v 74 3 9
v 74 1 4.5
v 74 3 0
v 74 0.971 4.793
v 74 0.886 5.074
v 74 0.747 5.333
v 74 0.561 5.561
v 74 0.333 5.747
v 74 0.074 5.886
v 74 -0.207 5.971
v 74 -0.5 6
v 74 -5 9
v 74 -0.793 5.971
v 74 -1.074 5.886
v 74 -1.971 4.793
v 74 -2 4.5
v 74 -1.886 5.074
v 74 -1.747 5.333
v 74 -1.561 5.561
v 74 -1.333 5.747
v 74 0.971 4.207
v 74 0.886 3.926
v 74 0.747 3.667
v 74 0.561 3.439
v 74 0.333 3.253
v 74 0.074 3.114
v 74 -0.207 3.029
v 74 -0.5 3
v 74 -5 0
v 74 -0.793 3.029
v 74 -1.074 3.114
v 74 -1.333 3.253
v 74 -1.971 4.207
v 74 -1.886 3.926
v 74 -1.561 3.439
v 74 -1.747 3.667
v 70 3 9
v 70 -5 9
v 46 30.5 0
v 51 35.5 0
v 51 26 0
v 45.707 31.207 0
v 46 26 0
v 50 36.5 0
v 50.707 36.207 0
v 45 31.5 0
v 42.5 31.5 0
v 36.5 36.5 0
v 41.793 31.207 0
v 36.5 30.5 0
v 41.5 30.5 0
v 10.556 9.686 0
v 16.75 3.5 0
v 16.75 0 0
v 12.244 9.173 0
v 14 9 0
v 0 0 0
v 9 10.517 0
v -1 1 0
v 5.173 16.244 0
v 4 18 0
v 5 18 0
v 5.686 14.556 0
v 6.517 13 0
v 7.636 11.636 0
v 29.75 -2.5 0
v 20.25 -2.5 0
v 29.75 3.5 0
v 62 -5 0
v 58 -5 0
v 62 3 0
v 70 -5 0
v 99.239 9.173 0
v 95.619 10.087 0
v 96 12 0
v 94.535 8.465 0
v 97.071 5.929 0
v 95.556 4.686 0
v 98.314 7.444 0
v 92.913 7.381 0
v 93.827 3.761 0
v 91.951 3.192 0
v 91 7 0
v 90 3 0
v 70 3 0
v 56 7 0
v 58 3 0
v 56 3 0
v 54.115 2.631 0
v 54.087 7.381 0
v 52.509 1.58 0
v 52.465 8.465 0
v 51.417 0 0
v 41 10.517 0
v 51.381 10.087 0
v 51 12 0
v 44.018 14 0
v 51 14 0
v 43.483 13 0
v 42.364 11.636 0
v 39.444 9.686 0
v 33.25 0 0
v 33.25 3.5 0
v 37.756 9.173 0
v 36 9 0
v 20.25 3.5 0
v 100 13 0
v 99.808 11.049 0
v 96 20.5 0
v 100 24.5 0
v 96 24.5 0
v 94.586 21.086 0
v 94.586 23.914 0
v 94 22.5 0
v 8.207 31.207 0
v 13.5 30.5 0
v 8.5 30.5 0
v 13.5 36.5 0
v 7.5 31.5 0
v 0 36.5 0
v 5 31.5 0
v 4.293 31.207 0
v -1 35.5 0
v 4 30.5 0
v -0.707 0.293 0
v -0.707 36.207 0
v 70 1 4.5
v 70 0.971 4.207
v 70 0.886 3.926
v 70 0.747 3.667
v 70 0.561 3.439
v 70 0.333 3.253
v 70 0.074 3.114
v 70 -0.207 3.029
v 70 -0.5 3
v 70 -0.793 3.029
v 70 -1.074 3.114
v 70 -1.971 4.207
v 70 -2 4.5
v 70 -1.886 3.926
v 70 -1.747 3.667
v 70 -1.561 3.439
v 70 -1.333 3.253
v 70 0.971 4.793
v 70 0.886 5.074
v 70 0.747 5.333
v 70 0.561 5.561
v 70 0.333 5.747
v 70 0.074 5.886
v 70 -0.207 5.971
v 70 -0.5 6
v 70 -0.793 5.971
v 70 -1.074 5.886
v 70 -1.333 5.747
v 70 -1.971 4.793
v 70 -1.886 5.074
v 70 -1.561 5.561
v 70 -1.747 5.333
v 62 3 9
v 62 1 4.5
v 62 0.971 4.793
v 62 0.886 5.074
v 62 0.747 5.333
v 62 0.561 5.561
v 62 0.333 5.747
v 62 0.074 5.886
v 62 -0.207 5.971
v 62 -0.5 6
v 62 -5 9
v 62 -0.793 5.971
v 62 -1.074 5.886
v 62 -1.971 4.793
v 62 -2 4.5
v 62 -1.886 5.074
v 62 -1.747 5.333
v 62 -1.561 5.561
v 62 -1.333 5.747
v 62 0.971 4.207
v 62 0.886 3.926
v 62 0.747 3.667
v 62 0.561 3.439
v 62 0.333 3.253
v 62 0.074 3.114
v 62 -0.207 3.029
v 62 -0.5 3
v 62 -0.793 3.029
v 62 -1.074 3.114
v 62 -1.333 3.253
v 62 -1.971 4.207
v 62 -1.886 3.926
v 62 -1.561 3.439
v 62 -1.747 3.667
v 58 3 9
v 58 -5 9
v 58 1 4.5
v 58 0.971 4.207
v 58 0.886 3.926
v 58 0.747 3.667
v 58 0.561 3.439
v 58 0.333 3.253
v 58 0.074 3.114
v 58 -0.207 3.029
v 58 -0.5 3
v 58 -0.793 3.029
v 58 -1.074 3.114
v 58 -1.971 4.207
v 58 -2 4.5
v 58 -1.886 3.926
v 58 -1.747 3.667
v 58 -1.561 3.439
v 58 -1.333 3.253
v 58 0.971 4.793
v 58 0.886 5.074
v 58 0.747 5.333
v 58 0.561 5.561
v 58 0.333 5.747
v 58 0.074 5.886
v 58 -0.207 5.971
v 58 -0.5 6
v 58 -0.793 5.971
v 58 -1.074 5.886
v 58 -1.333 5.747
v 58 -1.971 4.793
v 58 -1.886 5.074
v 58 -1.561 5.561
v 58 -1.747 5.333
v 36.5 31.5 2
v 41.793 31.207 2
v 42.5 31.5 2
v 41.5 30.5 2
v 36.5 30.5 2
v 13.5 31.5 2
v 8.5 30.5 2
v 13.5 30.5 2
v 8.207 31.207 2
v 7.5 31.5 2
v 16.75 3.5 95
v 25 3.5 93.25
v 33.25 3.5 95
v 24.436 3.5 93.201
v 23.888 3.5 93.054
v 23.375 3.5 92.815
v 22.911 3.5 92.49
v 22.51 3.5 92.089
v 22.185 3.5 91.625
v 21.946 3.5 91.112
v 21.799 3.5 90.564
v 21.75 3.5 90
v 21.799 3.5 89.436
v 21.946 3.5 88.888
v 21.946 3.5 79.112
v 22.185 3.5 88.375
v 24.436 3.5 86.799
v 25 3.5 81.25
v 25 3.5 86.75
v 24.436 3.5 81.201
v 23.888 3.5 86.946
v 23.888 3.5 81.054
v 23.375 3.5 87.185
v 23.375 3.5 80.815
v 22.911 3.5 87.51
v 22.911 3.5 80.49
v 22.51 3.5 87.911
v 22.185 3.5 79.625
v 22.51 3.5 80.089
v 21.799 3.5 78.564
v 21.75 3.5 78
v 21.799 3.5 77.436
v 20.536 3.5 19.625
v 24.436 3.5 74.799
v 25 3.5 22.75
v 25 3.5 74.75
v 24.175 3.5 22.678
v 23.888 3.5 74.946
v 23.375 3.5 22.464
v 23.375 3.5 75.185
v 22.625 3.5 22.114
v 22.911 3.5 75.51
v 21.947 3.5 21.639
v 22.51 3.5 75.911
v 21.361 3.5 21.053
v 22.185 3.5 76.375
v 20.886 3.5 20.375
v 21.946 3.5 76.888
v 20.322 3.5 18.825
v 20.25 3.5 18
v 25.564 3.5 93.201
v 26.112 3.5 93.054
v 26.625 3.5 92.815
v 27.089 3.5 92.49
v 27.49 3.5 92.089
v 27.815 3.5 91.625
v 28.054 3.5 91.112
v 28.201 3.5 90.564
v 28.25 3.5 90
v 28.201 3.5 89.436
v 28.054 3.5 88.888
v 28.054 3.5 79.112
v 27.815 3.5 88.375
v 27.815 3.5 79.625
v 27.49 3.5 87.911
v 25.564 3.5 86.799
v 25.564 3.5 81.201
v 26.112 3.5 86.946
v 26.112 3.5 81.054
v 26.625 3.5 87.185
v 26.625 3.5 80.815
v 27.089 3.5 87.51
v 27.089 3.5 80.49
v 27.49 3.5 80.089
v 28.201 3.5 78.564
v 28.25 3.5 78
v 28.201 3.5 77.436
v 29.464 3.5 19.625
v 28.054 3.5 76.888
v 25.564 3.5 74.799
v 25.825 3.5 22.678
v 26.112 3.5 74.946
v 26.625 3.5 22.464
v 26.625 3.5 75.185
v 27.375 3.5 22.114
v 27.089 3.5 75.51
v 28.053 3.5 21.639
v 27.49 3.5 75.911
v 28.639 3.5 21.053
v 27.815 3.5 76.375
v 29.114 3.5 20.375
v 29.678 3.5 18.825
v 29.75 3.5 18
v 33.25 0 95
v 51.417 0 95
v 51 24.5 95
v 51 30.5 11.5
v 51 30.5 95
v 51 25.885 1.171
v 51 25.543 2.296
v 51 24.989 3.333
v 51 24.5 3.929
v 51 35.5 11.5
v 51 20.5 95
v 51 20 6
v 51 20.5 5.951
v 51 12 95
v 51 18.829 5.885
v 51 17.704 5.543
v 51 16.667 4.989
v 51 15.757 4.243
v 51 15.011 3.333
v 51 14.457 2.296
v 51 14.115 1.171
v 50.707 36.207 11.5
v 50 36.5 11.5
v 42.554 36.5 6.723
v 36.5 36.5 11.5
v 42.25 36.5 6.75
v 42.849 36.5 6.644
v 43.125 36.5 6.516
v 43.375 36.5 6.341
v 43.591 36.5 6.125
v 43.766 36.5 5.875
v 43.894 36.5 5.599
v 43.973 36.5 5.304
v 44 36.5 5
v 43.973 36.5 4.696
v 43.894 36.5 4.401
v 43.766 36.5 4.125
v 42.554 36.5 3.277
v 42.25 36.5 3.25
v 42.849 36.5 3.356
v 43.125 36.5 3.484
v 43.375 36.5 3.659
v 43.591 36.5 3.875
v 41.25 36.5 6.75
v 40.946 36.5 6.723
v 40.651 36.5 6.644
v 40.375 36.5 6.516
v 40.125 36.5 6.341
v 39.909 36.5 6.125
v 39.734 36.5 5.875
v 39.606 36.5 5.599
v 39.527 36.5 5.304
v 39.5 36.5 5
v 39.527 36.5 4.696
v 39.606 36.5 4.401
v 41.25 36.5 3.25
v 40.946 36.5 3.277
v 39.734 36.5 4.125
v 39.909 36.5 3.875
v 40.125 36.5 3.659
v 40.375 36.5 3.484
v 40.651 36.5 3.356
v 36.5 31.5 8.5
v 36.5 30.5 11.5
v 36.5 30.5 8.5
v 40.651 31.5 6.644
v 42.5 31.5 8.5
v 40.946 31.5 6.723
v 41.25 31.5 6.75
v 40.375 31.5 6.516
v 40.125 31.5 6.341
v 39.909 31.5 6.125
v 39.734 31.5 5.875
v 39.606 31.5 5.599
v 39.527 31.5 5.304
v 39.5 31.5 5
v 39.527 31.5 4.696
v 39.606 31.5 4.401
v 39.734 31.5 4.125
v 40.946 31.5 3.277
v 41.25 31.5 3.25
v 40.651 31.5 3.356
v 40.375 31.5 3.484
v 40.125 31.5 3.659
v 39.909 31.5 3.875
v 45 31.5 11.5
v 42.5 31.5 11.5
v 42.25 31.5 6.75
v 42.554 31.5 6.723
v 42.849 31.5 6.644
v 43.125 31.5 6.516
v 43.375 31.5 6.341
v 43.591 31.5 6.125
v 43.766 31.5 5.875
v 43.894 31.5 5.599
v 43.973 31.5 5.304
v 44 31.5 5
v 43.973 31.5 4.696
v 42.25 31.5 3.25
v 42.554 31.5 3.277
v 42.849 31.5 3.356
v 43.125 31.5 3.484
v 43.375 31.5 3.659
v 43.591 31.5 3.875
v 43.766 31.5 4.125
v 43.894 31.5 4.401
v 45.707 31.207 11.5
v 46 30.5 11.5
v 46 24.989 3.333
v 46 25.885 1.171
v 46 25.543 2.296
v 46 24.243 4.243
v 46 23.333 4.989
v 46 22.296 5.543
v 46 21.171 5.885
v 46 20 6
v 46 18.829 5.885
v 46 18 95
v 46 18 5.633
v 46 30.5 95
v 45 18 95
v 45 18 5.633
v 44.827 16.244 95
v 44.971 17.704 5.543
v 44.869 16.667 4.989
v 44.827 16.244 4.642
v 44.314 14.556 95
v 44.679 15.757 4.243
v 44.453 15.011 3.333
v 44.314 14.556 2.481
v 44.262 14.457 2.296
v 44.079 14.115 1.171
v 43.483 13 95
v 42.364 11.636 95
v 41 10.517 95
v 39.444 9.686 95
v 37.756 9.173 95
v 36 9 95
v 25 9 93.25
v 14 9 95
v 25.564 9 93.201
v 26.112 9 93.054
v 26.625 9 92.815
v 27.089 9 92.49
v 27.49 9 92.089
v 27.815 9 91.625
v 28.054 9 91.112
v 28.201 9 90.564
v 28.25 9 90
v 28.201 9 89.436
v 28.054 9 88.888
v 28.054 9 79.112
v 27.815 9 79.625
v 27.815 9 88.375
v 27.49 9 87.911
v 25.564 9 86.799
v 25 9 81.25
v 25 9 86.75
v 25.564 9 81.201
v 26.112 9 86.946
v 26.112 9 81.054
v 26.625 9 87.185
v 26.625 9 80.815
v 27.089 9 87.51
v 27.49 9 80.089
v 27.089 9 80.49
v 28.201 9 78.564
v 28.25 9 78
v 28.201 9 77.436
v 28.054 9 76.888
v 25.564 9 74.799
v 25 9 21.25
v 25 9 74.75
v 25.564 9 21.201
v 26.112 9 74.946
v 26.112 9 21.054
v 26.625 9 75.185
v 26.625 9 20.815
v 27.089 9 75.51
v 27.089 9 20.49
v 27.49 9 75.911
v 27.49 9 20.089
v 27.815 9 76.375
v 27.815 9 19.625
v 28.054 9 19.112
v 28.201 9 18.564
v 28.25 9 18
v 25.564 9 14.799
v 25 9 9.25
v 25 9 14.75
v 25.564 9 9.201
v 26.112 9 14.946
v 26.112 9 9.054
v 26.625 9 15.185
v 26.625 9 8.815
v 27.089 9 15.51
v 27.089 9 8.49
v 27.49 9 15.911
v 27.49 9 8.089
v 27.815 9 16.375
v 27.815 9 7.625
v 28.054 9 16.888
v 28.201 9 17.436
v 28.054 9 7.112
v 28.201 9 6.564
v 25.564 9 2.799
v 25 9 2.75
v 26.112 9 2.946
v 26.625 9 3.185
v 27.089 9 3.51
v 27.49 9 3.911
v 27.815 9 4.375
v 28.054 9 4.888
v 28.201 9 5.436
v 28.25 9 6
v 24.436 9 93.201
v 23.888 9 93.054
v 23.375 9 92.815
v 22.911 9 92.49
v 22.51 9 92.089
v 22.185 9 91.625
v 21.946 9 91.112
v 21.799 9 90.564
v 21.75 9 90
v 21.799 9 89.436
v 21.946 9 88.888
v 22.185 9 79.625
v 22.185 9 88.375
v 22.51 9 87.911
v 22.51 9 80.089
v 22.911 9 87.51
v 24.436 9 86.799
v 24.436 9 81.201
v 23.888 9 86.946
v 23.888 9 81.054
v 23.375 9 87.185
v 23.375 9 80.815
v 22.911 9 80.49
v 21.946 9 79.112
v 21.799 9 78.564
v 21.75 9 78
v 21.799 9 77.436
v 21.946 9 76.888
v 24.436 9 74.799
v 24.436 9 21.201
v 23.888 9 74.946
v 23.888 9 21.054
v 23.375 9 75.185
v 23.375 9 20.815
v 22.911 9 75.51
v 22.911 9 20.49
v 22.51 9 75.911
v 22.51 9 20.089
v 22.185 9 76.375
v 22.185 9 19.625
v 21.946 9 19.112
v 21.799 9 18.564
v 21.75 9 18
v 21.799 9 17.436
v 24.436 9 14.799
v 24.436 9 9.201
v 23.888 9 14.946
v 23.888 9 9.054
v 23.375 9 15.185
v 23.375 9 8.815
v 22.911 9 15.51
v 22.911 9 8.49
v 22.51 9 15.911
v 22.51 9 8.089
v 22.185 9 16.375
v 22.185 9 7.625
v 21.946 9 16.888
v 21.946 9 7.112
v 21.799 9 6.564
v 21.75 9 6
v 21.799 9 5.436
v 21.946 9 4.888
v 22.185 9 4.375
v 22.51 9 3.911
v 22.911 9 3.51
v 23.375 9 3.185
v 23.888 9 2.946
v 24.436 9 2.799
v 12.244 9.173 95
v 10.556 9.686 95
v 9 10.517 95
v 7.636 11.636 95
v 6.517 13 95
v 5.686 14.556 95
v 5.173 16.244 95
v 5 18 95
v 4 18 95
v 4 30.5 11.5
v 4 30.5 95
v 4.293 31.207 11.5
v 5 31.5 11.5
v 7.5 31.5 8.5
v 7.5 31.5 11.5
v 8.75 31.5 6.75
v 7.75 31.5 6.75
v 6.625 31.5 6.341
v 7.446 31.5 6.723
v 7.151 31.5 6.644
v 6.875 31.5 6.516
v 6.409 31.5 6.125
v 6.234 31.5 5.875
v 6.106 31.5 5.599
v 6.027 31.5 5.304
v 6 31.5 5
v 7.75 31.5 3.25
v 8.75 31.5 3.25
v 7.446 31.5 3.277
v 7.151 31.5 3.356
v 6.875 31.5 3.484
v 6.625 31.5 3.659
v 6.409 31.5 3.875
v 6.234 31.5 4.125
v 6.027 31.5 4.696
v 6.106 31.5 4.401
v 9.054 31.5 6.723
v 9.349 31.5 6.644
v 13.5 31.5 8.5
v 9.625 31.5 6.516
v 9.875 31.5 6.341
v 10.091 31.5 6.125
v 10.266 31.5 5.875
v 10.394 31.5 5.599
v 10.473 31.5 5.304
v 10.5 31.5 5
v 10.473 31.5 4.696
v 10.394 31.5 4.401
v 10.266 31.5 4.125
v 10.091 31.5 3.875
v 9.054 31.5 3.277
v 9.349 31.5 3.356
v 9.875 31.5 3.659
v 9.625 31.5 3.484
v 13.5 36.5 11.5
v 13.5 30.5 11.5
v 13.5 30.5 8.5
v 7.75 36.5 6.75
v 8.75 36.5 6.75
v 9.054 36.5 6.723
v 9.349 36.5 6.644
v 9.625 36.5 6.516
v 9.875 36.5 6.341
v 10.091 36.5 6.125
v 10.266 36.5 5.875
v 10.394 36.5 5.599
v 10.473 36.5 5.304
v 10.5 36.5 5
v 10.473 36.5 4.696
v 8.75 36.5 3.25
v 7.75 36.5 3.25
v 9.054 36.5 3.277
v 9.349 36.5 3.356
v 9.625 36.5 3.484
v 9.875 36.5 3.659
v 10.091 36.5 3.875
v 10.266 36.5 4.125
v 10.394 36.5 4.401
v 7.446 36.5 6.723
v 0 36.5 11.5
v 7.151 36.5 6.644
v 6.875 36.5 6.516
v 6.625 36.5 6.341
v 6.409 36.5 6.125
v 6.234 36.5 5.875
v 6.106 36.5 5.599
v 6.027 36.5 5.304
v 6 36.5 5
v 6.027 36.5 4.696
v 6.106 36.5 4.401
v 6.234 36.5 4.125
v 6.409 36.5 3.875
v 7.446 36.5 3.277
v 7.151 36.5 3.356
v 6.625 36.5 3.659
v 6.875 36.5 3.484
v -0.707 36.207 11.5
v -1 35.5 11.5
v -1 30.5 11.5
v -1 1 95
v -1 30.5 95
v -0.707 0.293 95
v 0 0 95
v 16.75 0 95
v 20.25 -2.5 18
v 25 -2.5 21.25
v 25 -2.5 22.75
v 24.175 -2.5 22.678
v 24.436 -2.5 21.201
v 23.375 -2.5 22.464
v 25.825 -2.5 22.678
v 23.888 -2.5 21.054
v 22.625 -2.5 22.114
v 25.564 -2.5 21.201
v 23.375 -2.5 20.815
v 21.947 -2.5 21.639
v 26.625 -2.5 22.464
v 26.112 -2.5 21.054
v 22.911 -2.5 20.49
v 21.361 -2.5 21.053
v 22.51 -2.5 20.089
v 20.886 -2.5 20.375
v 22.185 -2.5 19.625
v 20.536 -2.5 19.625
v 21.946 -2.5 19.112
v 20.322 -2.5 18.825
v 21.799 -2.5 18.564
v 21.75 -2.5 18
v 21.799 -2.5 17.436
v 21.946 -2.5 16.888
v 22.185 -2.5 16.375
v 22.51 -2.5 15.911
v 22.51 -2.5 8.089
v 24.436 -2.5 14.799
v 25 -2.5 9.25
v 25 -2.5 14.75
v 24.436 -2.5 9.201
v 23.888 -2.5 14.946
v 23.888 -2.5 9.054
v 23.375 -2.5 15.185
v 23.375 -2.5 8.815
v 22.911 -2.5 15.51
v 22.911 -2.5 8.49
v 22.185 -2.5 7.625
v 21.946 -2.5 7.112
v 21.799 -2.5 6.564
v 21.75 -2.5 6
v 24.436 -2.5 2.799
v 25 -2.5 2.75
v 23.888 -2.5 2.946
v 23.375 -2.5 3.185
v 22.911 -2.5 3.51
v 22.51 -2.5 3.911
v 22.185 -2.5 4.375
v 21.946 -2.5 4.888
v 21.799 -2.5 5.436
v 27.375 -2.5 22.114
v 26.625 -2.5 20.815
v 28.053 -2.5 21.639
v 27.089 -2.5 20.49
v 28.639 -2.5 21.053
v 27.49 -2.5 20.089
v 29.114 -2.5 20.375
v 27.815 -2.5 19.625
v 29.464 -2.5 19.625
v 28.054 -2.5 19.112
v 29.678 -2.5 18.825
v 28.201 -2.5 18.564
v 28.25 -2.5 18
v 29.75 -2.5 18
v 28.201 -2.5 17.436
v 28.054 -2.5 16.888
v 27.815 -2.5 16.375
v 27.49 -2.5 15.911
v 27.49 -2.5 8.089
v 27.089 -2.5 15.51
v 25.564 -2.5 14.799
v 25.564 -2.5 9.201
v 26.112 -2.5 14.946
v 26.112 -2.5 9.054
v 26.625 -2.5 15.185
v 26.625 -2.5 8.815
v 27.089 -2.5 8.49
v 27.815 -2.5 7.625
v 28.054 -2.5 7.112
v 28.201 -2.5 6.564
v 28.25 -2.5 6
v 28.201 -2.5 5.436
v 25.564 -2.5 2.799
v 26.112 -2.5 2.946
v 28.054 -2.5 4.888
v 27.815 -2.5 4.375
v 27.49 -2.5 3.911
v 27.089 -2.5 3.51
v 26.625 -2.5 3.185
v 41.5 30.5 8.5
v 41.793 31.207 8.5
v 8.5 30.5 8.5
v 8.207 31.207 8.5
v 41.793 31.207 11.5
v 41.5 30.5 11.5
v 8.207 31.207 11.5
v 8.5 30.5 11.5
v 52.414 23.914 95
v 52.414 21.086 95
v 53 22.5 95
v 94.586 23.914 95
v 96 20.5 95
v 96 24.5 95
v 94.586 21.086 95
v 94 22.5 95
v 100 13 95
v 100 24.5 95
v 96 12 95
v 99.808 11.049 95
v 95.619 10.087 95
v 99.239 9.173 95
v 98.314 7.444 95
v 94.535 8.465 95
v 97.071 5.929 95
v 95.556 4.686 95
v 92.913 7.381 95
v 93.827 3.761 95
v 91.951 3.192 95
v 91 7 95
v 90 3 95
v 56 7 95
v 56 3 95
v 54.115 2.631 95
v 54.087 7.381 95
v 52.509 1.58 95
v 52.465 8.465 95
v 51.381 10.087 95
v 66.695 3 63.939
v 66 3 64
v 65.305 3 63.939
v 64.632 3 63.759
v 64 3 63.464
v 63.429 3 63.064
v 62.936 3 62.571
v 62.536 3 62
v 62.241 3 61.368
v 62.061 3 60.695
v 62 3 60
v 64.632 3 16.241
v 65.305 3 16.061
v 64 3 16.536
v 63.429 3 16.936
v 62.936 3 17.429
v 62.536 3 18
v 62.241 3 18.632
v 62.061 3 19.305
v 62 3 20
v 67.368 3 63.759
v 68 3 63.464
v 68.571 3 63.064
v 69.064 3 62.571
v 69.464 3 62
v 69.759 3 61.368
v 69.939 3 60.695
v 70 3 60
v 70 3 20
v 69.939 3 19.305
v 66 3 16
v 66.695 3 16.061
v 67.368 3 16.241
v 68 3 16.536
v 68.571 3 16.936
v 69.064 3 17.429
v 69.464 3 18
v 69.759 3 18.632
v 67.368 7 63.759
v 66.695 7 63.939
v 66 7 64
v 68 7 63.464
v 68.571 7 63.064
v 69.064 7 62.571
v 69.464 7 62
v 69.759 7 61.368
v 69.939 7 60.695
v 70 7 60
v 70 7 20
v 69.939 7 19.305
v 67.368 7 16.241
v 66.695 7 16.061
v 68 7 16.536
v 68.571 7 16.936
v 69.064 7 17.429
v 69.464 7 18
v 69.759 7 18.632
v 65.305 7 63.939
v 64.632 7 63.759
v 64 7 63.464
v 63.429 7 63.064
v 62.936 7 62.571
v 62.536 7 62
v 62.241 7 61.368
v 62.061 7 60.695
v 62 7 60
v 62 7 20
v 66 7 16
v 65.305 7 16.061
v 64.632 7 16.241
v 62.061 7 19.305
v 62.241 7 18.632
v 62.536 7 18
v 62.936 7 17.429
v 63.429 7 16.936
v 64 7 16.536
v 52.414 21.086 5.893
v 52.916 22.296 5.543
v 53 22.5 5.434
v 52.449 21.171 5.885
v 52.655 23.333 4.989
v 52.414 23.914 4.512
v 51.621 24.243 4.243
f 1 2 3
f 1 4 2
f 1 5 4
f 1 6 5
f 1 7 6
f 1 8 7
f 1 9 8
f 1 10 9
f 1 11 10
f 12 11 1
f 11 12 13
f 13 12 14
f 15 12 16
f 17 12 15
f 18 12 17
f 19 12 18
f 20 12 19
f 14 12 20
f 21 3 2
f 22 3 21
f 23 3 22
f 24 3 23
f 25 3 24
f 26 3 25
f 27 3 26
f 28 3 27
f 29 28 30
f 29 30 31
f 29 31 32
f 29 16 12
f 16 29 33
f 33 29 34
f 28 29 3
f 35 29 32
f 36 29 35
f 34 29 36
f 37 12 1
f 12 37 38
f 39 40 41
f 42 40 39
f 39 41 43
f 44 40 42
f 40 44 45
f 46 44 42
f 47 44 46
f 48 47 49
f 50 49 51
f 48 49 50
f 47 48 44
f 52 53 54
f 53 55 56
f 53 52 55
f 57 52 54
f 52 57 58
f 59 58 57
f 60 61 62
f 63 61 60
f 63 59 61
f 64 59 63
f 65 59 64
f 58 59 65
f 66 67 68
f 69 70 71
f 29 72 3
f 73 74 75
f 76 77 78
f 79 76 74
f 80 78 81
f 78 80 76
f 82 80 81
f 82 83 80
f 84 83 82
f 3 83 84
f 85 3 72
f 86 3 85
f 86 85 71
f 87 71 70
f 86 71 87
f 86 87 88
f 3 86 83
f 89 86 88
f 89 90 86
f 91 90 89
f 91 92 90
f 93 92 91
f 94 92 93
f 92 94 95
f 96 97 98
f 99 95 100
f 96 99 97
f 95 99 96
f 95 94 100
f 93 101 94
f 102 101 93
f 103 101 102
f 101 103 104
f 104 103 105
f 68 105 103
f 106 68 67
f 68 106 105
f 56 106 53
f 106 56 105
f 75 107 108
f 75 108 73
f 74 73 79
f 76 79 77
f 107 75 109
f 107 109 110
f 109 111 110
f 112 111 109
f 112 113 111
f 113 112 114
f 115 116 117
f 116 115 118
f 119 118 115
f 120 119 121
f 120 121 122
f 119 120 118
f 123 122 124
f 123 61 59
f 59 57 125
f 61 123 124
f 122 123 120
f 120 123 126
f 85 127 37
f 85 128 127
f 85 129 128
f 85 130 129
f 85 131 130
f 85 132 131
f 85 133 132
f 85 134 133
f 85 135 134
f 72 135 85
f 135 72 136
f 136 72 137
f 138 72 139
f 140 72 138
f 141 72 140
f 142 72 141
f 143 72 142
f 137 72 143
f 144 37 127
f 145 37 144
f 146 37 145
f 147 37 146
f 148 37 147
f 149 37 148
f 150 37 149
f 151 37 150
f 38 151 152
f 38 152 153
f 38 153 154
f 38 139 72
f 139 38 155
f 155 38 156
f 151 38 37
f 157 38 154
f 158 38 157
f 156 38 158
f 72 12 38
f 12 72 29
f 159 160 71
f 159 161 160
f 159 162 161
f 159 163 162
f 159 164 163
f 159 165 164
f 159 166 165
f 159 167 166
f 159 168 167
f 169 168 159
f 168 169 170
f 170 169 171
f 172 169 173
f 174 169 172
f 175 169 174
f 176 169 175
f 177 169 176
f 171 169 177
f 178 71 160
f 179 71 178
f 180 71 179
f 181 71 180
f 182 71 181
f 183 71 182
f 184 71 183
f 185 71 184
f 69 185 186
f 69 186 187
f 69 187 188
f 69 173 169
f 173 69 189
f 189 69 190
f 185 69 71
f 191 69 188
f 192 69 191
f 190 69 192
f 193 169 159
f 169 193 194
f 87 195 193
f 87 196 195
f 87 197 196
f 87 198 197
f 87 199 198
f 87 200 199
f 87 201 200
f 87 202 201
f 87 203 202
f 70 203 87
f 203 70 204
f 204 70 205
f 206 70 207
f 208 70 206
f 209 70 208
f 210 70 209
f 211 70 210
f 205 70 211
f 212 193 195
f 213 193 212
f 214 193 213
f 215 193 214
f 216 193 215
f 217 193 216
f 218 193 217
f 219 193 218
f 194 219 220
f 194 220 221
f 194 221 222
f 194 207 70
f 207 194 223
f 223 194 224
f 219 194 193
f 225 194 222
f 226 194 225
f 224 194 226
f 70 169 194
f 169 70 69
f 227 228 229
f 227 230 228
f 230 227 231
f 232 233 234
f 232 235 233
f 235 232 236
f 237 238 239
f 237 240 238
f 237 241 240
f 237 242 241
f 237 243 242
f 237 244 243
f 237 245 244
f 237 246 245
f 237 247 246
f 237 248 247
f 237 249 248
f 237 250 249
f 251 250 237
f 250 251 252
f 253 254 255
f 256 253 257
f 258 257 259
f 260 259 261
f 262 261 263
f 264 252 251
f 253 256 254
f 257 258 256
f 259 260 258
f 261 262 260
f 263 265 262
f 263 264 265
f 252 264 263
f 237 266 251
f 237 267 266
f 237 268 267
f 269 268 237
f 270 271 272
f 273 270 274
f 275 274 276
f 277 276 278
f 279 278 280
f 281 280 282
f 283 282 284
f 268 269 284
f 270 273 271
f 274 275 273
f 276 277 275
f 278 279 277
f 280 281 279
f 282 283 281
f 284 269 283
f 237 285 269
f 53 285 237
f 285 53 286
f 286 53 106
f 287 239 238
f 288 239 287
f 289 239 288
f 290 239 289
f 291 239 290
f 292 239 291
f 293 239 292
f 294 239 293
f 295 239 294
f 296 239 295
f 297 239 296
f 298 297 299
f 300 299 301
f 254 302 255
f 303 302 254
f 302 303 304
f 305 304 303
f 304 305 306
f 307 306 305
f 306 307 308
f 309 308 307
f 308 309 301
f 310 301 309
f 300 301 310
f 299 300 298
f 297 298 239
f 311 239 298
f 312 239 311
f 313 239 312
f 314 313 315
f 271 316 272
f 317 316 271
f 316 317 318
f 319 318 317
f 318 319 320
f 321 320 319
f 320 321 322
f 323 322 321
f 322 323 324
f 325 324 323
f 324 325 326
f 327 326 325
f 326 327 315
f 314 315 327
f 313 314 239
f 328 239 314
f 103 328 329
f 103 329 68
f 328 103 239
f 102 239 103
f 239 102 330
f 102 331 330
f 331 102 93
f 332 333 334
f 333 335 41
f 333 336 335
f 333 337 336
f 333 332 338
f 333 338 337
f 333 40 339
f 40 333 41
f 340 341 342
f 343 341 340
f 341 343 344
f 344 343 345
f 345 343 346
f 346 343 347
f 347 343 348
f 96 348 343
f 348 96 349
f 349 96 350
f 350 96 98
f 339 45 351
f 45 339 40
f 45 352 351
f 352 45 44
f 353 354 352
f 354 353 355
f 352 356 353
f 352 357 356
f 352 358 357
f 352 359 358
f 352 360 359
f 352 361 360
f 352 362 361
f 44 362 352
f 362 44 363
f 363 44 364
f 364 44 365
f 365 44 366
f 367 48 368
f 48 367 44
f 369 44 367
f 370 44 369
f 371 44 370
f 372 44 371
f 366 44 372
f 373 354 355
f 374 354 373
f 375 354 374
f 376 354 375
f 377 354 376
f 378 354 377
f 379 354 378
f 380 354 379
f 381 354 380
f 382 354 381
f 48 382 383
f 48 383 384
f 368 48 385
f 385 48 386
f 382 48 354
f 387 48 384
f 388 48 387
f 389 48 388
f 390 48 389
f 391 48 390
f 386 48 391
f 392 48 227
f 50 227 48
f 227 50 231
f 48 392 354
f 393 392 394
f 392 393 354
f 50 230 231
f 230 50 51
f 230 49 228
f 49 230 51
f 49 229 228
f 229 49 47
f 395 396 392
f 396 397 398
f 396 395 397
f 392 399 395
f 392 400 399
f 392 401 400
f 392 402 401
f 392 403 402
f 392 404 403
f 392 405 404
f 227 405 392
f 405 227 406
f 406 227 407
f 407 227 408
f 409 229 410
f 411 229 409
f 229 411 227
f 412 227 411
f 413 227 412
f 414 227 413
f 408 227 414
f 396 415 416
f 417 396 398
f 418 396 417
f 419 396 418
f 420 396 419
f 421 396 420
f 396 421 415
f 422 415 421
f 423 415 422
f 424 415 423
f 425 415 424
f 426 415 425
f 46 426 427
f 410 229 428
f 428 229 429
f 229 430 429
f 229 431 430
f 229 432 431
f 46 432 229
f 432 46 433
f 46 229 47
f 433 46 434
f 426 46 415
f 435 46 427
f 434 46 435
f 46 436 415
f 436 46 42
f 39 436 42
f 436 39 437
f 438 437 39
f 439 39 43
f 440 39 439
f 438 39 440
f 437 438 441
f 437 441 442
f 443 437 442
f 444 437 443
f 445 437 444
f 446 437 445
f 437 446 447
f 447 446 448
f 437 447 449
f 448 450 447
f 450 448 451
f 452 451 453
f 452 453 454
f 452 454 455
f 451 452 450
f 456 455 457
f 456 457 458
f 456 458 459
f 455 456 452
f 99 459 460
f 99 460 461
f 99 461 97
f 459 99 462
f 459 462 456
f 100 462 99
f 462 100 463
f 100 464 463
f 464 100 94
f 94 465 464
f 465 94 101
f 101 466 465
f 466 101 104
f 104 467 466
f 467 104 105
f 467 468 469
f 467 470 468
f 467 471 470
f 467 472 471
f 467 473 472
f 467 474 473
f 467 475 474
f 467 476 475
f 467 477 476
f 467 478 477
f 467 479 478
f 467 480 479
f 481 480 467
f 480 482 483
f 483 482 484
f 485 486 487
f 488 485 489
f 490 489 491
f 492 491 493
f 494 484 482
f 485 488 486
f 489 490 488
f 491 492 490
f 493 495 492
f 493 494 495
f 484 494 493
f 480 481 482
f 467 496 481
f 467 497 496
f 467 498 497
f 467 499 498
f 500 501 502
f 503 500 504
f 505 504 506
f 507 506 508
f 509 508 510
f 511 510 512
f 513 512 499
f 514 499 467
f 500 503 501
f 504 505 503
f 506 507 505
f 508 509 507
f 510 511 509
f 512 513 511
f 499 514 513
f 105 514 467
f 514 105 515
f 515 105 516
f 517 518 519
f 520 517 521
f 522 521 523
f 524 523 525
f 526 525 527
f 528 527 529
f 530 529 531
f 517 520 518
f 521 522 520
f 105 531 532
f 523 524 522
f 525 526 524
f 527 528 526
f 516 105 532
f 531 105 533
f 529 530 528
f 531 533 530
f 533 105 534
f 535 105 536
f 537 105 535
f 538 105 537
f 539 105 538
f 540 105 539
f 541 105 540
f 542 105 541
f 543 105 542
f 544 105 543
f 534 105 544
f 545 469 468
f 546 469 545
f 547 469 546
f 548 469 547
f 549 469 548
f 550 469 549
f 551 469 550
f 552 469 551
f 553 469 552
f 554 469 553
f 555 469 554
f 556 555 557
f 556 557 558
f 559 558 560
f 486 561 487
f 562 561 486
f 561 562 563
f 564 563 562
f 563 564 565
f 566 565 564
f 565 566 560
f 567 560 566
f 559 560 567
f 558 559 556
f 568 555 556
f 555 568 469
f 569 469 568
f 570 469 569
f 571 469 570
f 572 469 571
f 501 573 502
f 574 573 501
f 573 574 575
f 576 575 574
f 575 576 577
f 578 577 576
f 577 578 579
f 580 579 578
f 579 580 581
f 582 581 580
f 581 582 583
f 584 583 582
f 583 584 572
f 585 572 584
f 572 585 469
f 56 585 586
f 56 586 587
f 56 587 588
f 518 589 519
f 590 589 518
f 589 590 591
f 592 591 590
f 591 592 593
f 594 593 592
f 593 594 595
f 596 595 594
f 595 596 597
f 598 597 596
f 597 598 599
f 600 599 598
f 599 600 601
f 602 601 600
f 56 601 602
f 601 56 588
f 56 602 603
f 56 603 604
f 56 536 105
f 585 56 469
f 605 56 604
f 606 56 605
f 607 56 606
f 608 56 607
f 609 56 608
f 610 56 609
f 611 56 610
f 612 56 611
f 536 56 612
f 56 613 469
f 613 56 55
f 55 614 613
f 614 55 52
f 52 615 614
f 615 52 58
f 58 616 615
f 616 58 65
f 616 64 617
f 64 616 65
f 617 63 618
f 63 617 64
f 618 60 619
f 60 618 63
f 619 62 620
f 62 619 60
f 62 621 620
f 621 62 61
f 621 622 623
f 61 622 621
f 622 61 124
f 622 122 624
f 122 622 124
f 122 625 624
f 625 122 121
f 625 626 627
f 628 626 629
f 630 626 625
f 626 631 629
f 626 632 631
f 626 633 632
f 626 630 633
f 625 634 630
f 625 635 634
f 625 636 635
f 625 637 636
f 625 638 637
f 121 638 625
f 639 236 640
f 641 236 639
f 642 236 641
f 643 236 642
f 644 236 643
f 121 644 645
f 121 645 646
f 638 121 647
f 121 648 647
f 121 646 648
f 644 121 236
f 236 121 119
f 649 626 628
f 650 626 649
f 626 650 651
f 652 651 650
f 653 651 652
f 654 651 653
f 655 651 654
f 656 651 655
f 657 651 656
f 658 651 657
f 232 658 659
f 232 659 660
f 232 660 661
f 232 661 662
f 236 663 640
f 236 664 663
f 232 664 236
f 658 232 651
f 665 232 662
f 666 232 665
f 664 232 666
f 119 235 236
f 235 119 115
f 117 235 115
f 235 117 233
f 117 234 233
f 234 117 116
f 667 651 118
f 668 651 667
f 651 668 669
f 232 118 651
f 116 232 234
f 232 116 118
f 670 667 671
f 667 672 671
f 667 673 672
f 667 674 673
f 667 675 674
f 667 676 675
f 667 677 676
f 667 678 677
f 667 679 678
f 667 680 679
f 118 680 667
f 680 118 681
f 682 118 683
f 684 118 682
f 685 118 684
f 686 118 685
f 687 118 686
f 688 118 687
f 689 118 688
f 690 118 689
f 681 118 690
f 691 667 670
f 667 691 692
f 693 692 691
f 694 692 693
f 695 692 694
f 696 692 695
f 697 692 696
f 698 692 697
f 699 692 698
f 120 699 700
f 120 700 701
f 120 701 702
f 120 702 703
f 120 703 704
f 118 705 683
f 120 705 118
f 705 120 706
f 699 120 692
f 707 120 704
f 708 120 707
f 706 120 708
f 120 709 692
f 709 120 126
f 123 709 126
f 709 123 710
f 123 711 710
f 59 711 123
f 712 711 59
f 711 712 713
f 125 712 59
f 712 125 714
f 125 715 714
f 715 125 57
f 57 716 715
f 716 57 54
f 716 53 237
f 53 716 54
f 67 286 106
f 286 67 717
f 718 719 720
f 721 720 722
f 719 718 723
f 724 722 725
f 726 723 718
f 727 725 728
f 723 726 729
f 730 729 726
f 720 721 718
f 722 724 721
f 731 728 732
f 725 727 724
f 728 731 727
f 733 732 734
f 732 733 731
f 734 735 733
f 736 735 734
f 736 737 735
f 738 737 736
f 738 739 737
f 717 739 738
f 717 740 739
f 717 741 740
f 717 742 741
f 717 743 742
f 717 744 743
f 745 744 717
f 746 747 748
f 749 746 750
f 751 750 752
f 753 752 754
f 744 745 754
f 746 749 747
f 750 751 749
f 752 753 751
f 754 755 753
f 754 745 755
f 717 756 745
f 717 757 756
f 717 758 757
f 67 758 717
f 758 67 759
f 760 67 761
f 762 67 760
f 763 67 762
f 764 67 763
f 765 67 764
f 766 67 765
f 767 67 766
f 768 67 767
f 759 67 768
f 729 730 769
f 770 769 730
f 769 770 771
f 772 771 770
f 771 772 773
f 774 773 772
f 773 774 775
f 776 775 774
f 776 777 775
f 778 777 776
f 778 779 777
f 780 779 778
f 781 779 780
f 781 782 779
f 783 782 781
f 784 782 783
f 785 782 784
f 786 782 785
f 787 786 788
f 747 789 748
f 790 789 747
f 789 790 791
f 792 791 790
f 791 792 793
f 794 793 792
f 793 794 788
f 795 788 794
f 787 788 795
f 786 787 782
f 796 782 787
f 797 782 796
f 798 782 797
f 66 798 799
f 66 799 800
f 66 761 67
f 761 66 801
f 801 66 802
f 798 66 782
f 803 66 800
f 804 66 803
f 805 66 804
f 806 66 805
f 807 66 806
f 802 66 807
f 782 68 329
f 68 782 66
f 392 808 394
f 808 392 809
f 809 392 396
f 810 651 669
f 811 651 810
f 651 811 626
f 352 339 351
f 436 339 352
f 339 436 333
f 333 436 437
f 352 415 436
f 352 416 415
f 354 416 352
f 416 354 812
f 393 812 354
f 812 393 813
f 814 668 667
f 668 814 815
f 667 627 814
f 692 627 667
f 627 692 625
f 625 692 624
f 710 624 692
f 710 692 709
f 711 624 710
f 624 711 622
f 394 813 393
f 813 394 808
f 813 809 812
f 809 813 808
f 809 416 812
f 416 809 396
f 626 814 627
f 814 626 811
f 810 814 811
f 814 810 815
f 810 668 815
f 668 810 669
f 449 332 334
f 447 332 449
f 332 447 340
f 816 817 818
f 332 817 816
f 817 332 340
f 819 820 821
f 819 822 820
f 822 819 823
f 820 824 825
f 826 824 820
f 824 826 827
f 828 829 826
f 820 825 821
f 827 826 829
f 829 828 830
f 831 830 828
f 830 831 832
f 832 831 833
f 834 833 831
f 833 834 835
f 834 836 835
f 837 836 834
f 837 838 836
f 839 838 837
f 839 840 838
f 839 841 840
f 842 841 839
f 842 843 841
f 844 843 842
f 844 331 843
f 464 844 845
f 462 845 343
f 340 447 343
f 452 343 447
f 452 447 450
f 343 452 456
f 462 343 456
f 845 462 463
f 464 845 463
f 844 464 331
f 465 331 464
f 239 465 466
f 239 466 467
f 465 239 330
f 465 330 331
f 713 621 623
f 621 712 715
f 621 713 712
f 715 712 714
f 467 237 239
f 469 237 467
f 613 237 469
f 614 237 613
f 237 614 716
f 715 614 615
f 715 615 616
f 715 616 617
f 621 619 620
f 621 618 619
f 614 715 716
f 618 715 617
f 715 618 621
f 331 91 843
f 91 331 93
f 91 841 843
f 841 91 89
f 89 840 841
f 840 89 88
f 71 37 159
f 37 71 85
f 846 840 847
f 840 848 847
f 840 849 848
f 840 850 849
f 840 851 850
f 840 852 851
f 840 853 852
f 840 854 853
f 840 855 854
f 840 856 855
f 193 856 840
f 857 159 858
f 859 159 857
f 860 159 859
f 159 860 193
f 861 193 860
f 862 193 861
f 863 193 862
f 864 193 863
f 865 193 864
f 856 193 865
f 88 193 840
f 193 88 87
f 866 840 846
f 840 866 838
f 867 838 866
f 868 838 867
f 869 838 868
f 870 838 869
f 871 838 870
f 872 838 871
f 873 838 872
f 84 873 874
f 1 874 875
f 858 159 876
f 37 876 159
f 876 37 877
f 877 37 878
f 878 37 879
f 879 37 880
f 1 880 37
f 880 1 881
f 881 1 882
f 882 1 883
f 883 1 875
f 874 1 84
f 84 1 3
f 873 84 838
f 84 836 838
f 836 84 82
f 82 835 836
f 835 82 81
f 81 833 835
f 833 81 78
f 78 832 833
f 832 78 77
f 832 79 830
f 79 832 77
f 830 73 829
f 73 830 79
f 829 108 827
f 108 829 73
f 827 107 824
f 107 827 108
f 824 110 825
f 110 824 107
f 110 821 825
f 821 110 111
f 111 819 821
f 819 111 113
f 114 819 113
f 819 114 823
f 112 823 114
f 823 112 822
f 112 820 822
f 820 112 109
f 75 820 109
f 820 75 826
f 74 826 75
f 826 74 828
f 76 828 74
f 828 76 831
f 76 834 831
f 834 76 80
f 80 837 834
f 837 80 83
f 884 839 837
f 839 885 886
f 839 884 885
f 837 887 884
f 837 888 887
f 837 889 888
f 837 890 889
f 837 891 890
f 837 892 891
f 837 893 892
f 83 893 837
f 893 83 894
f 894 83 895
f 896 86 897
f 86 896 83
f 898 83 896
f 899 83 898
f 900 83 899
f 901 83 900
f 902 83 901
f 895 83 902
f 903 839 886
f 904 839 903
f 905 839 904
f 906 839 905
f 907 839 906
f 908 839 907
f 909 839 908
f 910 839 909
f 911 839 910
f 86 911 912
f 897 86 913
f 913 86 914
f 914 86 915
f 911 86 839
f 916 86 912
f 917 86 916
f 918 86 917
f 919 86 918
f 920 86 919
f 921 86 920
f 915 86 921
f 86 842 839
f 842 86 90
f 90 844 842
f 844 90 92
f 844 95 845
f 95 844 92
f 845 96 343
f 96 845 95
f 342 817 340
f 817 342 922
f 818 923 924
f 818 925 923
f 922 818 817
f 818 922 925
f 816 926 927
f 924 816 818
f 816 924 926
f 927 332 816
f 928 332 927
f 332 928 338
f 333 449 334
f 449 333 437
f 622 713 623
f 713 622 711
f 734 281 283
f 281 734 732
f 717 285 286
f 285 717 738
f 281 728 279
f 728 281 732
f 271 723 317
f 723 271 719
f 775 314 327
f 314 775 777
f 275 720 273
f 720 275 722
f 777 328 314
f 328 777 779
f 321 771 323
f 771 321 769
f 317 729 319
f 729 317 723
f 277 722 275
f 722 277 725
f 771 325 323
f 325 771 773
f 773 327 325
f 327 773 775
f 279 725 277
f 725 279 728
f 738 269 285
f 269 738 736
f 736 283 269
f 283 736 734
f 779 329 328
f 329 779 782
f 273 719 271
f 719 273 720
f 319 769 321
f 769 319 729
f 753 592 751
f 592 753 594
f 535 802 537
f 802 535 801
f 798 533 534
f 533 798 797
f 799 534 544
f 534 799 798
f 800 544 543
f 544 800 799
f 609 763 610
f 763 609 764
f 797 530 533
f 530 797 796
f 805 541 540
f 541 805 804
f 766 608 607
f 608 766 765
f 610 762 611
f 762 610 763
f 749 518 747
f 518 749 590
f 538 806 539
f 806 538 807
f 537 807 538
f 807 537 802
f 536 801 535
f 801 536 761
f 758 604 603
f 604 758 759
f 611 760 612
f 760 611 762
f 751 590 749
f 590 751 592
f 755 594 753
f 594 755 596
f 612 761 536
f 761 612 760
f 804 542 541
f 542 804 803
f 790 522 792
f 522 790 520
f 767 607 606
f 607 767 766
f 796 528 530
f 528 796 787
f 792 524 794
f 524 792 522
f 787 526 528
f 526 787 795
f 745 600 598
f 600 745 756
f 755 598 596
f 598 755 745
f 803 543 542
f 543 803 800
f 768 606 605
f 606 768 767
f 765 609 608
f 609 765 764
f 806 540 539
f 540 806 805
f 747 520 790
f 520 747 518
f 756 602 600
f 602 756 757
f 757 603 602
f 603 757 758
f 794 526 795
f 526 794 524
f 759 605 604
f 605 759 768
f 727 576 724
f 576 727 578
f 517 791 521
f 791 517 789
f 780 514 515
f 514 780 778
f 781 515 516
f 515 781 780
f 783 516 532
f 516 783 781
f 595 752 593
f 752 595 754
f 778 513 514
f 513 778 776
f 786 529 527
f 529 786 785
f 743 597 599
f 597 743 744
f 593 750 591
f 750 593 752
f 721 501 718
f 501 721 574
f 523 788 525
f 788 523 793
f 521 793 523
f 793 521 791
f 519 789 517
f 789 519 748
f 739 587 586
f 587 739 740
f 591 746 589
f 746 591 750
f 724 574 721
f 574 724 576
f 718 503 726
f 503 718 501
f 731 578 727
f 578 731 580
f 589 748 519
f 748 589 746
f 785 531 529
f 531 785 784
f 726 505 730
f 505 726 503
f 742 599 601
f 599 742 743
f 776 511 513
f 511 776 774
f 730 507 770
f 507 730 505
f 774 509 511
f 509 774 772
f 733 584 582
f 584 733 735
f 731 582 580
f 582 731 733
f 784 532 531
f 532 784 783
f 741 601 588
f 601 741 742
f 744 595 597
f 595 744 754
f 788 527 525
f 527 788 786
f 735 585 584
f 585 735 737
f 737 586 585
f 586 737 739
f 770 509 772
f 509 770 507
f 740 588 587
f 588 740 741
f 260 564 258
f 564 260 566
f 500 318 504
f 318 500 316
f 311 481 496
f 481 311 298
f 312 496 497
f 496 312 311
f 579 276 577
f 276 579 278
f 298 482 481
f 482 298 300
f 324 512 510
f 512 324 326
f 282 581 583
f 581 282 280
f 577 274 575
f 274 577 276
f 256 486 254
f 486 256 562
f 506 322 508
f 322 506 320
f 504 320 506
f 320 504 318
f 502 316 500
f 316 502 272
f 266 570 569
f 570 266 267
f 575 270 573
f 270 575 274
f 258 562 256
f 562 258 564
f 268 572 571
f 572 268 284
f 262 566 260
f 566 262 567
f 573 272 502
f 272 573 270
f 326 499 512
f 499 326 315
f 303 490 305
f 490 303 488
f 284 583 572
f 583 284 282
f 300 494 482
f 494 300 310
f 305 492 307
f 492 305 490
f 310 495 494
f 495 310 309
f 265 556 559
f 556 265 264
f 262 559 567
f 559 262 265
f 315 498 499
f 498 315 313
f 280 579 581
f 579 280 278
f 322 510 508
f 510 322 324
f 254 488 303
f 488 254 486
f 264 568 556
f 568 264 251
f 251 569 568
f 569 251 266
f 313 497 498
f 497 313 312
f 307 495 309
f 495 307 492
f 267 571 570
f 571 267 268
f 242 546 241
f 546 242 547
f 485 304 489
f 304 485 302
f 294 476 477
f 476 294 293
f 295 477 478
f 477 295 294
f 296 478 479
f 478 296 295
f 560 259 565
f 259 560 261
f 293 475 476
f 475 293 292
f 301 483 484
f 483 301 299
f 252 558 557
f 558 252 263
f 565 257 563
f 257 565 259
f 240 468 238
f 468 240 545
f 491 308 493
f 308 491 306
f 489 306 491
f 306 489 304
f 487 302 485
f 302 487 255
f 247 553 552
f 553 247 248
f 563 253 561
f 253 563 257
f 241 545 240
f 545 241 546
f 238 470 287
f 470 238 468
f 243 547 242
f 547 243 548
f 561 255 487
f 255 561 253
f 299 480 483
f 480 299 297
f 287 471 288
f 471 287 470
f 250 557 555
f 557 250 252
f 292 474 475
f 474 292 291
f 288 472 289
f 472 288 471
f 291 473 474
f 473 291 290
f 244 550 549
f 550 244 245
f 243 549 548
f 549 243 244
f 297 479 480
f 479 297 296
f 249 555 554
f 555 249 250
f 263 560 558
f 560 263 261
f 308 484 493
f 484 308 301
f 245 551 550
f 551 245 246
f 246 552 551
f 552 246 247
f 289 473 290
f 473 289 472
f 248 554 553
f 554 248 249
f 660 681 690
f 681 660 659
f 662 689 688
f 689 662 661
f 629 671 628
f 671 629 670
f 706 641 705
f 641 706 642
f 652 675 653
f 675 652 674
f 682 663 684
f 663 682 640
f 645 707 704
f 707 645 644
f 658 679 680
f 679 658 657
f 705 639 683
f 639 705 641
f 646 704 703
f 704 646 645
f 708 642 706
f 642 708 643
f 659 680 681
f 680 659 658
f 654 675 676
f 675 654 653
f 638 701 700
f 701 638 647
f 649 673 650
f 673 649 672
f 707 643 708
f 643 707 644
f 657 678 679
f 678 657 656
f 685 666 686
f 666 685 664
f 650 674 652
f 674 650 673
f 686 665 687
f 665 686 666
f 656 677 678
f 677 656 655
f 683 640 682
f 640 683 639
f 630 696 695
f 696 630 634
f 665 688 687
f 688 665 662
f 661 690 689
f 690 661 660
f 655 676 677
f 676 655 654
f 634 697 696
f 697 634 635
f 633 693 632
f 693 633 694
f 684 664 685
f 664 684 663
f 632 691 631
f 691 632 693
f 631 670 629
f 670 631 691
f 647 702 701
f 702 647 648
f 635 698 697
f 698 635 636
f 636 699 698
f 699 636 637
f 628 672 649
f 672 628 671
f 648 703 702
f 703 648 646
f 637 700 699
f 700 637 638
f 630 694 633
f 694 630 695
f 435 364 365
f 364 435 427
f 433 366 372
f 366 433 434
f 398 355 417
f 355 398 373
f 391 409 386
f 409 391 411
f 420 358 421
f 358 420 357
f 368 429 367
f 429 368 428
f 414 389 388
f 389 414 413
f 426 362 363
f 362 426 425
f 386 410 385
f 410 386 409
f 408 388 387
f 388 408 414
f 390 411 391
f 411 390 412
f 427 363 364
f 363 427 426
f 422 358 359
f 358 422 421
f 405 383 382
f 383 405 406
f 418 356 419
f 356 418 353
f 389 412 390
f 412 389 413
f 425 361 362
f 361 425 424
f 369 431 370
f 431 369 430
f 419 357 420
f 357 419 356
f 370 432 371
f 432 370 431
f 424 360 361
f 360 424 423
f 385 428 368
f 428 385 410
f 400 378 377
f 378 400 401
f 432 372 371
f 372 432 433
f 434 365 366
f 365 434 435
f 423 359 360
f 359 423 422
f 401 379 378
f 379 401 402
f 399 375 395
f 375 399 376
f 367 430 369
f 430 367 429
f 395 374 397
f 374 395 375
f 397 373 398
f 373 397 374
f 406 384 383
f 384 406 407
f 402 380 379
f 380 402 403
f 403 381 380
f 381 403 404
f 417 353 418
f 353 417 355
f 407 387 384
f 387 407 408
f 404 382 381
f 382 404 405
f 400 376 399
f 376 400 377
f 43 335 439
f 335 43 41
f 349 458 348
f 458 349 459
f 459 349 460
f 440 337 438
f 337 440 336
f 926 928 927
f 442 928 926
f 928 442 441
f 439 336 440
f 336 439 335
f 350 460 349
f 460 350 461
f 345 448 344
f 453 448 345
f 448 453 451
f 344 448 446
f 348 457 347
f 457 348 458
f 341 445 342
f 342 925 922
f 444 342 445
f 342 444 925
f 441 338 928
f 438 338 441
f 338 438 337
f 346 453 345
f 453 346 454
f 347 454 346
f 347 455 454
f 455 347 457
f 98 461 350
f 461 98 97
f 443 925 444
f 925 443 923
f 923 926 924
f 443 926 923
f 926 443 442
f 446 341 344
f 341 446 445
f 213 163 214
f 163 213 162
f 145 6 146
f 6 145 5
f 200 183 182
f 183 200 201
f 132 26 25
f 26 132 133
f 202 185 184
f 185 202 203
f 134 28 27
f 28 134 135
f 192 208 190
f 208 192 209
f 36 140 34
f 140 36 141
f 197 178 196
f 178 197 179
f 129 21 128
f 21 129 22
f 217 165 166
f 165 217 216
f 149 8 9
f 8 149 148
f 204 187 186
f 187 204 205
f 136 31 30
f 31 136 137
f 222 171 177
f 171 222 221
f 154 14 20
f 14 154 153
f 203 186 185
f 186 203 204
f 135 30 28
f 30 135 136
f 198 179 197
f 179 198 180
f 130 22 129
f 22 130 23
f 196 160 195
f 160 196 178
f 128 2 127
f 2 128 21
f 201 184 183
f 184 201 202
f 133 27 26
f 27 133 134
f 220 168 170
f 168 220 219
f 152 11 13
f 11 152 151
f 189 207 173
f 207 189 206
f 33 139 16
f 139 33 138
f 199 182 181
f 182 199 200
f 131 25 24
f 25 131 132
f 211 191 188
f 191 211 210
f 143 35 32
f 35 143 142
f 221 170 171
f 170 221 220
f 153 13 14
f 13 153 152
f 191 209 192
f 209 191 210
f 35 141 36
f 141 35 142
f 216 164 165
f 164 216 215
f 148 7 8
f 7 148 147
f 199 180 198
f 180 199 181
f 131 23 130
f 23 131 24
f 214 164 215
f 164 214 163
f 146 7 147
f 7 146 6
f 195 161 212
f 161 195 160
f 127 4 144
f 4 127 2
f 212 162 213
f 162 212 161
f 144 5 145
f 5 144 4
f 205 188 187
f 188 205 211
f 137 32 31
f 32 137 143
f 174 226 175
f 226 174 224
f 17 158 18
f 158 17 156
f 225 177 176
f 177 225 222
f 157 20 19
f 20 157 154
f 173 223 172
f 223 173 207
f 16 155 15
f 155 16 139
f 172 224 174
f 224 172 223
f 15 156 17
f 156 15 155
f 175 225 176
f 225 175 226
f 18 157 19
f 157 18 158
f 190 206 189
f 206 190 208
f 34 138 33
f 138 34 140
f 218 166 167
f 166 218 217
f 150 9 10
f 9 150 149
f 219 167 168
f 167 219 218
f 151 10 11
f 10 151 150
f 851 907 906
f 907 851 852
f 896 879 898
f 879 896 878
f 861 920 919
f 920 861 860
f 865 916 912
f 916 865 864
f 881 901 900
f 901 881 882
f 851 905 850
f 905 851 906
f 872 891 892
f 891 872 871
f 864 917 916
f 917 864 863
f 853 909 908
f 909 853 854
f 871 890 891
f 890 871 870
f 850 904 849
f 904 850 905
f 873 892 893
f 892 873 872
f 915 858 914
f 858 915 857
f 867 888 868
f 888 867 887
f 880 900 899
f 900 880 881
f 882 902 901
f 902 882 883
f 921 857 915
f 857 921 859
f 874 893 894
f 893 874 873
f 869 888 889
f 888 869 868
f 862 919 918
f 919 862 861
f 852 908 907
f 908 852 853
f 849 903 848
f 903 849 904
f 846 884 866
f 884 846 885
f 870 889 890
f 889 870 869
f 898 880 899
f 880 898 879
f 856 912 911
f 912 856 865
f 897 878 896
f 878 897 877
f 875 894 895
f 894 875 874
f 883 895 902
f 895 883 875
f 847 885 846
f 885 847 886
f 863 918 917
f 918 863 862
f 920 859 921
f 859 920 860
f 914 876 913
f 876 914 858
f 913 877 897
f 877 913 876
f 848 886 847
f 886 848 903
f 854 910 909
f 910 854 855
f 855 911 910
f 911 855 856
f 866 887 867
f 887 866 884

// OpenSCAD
difference(){
union(){
linear_extrude(height=2)
import("neuPixHeadEnds_V5.dxf");

linear_extrude(height=8.51)
import("neuPixHeadMid_V5.dxf");

translate([0,0,8.5])
linear_extrude(height=3)
import("neuPixHeadEnds_V5.dxf");

linear_extrude(height=95)
import("neuPixBody2_V5.dxf");

hull()
for (zz=[6,18])
translate([24+1,7-2.5,zz])
rotate([90,0,0])
cylinder(d=9.5,h=7,$fn=36);

for (xx=[75-4-1,65-4-4+1])
translate([xx,-5,0])
cube([4,9,9]);

}

for (zz=[6,18,78,90])
translate([24+1,20,zz])
rotate([90,0,0])
cylinder(d=6.5,h=50,$fn=36);


for (xx=[8.5-0.75,50-8-0.75])
translate([xx,40,5])
rotate([90,0,0])
hull(){
cylinder(d=3.5,h=20,$fn=36);
translate([1,0,])
    cylinder(d=3.5,h=20,$fn=36);
}
translate([25,20,0])
rotate([0,90,0])
cylinder(d=12,h=50,$fn=32);

translate([76-20,-0.5,4.5])
rotate([0,90,0])
#cylinder(d=3,h=20,$fn=32);

hull()
for (zz=[20,60])
translate([66,20,zz])
rotate([90,0,0])
cylinder(d=8,h=50,$fn=36);

}
